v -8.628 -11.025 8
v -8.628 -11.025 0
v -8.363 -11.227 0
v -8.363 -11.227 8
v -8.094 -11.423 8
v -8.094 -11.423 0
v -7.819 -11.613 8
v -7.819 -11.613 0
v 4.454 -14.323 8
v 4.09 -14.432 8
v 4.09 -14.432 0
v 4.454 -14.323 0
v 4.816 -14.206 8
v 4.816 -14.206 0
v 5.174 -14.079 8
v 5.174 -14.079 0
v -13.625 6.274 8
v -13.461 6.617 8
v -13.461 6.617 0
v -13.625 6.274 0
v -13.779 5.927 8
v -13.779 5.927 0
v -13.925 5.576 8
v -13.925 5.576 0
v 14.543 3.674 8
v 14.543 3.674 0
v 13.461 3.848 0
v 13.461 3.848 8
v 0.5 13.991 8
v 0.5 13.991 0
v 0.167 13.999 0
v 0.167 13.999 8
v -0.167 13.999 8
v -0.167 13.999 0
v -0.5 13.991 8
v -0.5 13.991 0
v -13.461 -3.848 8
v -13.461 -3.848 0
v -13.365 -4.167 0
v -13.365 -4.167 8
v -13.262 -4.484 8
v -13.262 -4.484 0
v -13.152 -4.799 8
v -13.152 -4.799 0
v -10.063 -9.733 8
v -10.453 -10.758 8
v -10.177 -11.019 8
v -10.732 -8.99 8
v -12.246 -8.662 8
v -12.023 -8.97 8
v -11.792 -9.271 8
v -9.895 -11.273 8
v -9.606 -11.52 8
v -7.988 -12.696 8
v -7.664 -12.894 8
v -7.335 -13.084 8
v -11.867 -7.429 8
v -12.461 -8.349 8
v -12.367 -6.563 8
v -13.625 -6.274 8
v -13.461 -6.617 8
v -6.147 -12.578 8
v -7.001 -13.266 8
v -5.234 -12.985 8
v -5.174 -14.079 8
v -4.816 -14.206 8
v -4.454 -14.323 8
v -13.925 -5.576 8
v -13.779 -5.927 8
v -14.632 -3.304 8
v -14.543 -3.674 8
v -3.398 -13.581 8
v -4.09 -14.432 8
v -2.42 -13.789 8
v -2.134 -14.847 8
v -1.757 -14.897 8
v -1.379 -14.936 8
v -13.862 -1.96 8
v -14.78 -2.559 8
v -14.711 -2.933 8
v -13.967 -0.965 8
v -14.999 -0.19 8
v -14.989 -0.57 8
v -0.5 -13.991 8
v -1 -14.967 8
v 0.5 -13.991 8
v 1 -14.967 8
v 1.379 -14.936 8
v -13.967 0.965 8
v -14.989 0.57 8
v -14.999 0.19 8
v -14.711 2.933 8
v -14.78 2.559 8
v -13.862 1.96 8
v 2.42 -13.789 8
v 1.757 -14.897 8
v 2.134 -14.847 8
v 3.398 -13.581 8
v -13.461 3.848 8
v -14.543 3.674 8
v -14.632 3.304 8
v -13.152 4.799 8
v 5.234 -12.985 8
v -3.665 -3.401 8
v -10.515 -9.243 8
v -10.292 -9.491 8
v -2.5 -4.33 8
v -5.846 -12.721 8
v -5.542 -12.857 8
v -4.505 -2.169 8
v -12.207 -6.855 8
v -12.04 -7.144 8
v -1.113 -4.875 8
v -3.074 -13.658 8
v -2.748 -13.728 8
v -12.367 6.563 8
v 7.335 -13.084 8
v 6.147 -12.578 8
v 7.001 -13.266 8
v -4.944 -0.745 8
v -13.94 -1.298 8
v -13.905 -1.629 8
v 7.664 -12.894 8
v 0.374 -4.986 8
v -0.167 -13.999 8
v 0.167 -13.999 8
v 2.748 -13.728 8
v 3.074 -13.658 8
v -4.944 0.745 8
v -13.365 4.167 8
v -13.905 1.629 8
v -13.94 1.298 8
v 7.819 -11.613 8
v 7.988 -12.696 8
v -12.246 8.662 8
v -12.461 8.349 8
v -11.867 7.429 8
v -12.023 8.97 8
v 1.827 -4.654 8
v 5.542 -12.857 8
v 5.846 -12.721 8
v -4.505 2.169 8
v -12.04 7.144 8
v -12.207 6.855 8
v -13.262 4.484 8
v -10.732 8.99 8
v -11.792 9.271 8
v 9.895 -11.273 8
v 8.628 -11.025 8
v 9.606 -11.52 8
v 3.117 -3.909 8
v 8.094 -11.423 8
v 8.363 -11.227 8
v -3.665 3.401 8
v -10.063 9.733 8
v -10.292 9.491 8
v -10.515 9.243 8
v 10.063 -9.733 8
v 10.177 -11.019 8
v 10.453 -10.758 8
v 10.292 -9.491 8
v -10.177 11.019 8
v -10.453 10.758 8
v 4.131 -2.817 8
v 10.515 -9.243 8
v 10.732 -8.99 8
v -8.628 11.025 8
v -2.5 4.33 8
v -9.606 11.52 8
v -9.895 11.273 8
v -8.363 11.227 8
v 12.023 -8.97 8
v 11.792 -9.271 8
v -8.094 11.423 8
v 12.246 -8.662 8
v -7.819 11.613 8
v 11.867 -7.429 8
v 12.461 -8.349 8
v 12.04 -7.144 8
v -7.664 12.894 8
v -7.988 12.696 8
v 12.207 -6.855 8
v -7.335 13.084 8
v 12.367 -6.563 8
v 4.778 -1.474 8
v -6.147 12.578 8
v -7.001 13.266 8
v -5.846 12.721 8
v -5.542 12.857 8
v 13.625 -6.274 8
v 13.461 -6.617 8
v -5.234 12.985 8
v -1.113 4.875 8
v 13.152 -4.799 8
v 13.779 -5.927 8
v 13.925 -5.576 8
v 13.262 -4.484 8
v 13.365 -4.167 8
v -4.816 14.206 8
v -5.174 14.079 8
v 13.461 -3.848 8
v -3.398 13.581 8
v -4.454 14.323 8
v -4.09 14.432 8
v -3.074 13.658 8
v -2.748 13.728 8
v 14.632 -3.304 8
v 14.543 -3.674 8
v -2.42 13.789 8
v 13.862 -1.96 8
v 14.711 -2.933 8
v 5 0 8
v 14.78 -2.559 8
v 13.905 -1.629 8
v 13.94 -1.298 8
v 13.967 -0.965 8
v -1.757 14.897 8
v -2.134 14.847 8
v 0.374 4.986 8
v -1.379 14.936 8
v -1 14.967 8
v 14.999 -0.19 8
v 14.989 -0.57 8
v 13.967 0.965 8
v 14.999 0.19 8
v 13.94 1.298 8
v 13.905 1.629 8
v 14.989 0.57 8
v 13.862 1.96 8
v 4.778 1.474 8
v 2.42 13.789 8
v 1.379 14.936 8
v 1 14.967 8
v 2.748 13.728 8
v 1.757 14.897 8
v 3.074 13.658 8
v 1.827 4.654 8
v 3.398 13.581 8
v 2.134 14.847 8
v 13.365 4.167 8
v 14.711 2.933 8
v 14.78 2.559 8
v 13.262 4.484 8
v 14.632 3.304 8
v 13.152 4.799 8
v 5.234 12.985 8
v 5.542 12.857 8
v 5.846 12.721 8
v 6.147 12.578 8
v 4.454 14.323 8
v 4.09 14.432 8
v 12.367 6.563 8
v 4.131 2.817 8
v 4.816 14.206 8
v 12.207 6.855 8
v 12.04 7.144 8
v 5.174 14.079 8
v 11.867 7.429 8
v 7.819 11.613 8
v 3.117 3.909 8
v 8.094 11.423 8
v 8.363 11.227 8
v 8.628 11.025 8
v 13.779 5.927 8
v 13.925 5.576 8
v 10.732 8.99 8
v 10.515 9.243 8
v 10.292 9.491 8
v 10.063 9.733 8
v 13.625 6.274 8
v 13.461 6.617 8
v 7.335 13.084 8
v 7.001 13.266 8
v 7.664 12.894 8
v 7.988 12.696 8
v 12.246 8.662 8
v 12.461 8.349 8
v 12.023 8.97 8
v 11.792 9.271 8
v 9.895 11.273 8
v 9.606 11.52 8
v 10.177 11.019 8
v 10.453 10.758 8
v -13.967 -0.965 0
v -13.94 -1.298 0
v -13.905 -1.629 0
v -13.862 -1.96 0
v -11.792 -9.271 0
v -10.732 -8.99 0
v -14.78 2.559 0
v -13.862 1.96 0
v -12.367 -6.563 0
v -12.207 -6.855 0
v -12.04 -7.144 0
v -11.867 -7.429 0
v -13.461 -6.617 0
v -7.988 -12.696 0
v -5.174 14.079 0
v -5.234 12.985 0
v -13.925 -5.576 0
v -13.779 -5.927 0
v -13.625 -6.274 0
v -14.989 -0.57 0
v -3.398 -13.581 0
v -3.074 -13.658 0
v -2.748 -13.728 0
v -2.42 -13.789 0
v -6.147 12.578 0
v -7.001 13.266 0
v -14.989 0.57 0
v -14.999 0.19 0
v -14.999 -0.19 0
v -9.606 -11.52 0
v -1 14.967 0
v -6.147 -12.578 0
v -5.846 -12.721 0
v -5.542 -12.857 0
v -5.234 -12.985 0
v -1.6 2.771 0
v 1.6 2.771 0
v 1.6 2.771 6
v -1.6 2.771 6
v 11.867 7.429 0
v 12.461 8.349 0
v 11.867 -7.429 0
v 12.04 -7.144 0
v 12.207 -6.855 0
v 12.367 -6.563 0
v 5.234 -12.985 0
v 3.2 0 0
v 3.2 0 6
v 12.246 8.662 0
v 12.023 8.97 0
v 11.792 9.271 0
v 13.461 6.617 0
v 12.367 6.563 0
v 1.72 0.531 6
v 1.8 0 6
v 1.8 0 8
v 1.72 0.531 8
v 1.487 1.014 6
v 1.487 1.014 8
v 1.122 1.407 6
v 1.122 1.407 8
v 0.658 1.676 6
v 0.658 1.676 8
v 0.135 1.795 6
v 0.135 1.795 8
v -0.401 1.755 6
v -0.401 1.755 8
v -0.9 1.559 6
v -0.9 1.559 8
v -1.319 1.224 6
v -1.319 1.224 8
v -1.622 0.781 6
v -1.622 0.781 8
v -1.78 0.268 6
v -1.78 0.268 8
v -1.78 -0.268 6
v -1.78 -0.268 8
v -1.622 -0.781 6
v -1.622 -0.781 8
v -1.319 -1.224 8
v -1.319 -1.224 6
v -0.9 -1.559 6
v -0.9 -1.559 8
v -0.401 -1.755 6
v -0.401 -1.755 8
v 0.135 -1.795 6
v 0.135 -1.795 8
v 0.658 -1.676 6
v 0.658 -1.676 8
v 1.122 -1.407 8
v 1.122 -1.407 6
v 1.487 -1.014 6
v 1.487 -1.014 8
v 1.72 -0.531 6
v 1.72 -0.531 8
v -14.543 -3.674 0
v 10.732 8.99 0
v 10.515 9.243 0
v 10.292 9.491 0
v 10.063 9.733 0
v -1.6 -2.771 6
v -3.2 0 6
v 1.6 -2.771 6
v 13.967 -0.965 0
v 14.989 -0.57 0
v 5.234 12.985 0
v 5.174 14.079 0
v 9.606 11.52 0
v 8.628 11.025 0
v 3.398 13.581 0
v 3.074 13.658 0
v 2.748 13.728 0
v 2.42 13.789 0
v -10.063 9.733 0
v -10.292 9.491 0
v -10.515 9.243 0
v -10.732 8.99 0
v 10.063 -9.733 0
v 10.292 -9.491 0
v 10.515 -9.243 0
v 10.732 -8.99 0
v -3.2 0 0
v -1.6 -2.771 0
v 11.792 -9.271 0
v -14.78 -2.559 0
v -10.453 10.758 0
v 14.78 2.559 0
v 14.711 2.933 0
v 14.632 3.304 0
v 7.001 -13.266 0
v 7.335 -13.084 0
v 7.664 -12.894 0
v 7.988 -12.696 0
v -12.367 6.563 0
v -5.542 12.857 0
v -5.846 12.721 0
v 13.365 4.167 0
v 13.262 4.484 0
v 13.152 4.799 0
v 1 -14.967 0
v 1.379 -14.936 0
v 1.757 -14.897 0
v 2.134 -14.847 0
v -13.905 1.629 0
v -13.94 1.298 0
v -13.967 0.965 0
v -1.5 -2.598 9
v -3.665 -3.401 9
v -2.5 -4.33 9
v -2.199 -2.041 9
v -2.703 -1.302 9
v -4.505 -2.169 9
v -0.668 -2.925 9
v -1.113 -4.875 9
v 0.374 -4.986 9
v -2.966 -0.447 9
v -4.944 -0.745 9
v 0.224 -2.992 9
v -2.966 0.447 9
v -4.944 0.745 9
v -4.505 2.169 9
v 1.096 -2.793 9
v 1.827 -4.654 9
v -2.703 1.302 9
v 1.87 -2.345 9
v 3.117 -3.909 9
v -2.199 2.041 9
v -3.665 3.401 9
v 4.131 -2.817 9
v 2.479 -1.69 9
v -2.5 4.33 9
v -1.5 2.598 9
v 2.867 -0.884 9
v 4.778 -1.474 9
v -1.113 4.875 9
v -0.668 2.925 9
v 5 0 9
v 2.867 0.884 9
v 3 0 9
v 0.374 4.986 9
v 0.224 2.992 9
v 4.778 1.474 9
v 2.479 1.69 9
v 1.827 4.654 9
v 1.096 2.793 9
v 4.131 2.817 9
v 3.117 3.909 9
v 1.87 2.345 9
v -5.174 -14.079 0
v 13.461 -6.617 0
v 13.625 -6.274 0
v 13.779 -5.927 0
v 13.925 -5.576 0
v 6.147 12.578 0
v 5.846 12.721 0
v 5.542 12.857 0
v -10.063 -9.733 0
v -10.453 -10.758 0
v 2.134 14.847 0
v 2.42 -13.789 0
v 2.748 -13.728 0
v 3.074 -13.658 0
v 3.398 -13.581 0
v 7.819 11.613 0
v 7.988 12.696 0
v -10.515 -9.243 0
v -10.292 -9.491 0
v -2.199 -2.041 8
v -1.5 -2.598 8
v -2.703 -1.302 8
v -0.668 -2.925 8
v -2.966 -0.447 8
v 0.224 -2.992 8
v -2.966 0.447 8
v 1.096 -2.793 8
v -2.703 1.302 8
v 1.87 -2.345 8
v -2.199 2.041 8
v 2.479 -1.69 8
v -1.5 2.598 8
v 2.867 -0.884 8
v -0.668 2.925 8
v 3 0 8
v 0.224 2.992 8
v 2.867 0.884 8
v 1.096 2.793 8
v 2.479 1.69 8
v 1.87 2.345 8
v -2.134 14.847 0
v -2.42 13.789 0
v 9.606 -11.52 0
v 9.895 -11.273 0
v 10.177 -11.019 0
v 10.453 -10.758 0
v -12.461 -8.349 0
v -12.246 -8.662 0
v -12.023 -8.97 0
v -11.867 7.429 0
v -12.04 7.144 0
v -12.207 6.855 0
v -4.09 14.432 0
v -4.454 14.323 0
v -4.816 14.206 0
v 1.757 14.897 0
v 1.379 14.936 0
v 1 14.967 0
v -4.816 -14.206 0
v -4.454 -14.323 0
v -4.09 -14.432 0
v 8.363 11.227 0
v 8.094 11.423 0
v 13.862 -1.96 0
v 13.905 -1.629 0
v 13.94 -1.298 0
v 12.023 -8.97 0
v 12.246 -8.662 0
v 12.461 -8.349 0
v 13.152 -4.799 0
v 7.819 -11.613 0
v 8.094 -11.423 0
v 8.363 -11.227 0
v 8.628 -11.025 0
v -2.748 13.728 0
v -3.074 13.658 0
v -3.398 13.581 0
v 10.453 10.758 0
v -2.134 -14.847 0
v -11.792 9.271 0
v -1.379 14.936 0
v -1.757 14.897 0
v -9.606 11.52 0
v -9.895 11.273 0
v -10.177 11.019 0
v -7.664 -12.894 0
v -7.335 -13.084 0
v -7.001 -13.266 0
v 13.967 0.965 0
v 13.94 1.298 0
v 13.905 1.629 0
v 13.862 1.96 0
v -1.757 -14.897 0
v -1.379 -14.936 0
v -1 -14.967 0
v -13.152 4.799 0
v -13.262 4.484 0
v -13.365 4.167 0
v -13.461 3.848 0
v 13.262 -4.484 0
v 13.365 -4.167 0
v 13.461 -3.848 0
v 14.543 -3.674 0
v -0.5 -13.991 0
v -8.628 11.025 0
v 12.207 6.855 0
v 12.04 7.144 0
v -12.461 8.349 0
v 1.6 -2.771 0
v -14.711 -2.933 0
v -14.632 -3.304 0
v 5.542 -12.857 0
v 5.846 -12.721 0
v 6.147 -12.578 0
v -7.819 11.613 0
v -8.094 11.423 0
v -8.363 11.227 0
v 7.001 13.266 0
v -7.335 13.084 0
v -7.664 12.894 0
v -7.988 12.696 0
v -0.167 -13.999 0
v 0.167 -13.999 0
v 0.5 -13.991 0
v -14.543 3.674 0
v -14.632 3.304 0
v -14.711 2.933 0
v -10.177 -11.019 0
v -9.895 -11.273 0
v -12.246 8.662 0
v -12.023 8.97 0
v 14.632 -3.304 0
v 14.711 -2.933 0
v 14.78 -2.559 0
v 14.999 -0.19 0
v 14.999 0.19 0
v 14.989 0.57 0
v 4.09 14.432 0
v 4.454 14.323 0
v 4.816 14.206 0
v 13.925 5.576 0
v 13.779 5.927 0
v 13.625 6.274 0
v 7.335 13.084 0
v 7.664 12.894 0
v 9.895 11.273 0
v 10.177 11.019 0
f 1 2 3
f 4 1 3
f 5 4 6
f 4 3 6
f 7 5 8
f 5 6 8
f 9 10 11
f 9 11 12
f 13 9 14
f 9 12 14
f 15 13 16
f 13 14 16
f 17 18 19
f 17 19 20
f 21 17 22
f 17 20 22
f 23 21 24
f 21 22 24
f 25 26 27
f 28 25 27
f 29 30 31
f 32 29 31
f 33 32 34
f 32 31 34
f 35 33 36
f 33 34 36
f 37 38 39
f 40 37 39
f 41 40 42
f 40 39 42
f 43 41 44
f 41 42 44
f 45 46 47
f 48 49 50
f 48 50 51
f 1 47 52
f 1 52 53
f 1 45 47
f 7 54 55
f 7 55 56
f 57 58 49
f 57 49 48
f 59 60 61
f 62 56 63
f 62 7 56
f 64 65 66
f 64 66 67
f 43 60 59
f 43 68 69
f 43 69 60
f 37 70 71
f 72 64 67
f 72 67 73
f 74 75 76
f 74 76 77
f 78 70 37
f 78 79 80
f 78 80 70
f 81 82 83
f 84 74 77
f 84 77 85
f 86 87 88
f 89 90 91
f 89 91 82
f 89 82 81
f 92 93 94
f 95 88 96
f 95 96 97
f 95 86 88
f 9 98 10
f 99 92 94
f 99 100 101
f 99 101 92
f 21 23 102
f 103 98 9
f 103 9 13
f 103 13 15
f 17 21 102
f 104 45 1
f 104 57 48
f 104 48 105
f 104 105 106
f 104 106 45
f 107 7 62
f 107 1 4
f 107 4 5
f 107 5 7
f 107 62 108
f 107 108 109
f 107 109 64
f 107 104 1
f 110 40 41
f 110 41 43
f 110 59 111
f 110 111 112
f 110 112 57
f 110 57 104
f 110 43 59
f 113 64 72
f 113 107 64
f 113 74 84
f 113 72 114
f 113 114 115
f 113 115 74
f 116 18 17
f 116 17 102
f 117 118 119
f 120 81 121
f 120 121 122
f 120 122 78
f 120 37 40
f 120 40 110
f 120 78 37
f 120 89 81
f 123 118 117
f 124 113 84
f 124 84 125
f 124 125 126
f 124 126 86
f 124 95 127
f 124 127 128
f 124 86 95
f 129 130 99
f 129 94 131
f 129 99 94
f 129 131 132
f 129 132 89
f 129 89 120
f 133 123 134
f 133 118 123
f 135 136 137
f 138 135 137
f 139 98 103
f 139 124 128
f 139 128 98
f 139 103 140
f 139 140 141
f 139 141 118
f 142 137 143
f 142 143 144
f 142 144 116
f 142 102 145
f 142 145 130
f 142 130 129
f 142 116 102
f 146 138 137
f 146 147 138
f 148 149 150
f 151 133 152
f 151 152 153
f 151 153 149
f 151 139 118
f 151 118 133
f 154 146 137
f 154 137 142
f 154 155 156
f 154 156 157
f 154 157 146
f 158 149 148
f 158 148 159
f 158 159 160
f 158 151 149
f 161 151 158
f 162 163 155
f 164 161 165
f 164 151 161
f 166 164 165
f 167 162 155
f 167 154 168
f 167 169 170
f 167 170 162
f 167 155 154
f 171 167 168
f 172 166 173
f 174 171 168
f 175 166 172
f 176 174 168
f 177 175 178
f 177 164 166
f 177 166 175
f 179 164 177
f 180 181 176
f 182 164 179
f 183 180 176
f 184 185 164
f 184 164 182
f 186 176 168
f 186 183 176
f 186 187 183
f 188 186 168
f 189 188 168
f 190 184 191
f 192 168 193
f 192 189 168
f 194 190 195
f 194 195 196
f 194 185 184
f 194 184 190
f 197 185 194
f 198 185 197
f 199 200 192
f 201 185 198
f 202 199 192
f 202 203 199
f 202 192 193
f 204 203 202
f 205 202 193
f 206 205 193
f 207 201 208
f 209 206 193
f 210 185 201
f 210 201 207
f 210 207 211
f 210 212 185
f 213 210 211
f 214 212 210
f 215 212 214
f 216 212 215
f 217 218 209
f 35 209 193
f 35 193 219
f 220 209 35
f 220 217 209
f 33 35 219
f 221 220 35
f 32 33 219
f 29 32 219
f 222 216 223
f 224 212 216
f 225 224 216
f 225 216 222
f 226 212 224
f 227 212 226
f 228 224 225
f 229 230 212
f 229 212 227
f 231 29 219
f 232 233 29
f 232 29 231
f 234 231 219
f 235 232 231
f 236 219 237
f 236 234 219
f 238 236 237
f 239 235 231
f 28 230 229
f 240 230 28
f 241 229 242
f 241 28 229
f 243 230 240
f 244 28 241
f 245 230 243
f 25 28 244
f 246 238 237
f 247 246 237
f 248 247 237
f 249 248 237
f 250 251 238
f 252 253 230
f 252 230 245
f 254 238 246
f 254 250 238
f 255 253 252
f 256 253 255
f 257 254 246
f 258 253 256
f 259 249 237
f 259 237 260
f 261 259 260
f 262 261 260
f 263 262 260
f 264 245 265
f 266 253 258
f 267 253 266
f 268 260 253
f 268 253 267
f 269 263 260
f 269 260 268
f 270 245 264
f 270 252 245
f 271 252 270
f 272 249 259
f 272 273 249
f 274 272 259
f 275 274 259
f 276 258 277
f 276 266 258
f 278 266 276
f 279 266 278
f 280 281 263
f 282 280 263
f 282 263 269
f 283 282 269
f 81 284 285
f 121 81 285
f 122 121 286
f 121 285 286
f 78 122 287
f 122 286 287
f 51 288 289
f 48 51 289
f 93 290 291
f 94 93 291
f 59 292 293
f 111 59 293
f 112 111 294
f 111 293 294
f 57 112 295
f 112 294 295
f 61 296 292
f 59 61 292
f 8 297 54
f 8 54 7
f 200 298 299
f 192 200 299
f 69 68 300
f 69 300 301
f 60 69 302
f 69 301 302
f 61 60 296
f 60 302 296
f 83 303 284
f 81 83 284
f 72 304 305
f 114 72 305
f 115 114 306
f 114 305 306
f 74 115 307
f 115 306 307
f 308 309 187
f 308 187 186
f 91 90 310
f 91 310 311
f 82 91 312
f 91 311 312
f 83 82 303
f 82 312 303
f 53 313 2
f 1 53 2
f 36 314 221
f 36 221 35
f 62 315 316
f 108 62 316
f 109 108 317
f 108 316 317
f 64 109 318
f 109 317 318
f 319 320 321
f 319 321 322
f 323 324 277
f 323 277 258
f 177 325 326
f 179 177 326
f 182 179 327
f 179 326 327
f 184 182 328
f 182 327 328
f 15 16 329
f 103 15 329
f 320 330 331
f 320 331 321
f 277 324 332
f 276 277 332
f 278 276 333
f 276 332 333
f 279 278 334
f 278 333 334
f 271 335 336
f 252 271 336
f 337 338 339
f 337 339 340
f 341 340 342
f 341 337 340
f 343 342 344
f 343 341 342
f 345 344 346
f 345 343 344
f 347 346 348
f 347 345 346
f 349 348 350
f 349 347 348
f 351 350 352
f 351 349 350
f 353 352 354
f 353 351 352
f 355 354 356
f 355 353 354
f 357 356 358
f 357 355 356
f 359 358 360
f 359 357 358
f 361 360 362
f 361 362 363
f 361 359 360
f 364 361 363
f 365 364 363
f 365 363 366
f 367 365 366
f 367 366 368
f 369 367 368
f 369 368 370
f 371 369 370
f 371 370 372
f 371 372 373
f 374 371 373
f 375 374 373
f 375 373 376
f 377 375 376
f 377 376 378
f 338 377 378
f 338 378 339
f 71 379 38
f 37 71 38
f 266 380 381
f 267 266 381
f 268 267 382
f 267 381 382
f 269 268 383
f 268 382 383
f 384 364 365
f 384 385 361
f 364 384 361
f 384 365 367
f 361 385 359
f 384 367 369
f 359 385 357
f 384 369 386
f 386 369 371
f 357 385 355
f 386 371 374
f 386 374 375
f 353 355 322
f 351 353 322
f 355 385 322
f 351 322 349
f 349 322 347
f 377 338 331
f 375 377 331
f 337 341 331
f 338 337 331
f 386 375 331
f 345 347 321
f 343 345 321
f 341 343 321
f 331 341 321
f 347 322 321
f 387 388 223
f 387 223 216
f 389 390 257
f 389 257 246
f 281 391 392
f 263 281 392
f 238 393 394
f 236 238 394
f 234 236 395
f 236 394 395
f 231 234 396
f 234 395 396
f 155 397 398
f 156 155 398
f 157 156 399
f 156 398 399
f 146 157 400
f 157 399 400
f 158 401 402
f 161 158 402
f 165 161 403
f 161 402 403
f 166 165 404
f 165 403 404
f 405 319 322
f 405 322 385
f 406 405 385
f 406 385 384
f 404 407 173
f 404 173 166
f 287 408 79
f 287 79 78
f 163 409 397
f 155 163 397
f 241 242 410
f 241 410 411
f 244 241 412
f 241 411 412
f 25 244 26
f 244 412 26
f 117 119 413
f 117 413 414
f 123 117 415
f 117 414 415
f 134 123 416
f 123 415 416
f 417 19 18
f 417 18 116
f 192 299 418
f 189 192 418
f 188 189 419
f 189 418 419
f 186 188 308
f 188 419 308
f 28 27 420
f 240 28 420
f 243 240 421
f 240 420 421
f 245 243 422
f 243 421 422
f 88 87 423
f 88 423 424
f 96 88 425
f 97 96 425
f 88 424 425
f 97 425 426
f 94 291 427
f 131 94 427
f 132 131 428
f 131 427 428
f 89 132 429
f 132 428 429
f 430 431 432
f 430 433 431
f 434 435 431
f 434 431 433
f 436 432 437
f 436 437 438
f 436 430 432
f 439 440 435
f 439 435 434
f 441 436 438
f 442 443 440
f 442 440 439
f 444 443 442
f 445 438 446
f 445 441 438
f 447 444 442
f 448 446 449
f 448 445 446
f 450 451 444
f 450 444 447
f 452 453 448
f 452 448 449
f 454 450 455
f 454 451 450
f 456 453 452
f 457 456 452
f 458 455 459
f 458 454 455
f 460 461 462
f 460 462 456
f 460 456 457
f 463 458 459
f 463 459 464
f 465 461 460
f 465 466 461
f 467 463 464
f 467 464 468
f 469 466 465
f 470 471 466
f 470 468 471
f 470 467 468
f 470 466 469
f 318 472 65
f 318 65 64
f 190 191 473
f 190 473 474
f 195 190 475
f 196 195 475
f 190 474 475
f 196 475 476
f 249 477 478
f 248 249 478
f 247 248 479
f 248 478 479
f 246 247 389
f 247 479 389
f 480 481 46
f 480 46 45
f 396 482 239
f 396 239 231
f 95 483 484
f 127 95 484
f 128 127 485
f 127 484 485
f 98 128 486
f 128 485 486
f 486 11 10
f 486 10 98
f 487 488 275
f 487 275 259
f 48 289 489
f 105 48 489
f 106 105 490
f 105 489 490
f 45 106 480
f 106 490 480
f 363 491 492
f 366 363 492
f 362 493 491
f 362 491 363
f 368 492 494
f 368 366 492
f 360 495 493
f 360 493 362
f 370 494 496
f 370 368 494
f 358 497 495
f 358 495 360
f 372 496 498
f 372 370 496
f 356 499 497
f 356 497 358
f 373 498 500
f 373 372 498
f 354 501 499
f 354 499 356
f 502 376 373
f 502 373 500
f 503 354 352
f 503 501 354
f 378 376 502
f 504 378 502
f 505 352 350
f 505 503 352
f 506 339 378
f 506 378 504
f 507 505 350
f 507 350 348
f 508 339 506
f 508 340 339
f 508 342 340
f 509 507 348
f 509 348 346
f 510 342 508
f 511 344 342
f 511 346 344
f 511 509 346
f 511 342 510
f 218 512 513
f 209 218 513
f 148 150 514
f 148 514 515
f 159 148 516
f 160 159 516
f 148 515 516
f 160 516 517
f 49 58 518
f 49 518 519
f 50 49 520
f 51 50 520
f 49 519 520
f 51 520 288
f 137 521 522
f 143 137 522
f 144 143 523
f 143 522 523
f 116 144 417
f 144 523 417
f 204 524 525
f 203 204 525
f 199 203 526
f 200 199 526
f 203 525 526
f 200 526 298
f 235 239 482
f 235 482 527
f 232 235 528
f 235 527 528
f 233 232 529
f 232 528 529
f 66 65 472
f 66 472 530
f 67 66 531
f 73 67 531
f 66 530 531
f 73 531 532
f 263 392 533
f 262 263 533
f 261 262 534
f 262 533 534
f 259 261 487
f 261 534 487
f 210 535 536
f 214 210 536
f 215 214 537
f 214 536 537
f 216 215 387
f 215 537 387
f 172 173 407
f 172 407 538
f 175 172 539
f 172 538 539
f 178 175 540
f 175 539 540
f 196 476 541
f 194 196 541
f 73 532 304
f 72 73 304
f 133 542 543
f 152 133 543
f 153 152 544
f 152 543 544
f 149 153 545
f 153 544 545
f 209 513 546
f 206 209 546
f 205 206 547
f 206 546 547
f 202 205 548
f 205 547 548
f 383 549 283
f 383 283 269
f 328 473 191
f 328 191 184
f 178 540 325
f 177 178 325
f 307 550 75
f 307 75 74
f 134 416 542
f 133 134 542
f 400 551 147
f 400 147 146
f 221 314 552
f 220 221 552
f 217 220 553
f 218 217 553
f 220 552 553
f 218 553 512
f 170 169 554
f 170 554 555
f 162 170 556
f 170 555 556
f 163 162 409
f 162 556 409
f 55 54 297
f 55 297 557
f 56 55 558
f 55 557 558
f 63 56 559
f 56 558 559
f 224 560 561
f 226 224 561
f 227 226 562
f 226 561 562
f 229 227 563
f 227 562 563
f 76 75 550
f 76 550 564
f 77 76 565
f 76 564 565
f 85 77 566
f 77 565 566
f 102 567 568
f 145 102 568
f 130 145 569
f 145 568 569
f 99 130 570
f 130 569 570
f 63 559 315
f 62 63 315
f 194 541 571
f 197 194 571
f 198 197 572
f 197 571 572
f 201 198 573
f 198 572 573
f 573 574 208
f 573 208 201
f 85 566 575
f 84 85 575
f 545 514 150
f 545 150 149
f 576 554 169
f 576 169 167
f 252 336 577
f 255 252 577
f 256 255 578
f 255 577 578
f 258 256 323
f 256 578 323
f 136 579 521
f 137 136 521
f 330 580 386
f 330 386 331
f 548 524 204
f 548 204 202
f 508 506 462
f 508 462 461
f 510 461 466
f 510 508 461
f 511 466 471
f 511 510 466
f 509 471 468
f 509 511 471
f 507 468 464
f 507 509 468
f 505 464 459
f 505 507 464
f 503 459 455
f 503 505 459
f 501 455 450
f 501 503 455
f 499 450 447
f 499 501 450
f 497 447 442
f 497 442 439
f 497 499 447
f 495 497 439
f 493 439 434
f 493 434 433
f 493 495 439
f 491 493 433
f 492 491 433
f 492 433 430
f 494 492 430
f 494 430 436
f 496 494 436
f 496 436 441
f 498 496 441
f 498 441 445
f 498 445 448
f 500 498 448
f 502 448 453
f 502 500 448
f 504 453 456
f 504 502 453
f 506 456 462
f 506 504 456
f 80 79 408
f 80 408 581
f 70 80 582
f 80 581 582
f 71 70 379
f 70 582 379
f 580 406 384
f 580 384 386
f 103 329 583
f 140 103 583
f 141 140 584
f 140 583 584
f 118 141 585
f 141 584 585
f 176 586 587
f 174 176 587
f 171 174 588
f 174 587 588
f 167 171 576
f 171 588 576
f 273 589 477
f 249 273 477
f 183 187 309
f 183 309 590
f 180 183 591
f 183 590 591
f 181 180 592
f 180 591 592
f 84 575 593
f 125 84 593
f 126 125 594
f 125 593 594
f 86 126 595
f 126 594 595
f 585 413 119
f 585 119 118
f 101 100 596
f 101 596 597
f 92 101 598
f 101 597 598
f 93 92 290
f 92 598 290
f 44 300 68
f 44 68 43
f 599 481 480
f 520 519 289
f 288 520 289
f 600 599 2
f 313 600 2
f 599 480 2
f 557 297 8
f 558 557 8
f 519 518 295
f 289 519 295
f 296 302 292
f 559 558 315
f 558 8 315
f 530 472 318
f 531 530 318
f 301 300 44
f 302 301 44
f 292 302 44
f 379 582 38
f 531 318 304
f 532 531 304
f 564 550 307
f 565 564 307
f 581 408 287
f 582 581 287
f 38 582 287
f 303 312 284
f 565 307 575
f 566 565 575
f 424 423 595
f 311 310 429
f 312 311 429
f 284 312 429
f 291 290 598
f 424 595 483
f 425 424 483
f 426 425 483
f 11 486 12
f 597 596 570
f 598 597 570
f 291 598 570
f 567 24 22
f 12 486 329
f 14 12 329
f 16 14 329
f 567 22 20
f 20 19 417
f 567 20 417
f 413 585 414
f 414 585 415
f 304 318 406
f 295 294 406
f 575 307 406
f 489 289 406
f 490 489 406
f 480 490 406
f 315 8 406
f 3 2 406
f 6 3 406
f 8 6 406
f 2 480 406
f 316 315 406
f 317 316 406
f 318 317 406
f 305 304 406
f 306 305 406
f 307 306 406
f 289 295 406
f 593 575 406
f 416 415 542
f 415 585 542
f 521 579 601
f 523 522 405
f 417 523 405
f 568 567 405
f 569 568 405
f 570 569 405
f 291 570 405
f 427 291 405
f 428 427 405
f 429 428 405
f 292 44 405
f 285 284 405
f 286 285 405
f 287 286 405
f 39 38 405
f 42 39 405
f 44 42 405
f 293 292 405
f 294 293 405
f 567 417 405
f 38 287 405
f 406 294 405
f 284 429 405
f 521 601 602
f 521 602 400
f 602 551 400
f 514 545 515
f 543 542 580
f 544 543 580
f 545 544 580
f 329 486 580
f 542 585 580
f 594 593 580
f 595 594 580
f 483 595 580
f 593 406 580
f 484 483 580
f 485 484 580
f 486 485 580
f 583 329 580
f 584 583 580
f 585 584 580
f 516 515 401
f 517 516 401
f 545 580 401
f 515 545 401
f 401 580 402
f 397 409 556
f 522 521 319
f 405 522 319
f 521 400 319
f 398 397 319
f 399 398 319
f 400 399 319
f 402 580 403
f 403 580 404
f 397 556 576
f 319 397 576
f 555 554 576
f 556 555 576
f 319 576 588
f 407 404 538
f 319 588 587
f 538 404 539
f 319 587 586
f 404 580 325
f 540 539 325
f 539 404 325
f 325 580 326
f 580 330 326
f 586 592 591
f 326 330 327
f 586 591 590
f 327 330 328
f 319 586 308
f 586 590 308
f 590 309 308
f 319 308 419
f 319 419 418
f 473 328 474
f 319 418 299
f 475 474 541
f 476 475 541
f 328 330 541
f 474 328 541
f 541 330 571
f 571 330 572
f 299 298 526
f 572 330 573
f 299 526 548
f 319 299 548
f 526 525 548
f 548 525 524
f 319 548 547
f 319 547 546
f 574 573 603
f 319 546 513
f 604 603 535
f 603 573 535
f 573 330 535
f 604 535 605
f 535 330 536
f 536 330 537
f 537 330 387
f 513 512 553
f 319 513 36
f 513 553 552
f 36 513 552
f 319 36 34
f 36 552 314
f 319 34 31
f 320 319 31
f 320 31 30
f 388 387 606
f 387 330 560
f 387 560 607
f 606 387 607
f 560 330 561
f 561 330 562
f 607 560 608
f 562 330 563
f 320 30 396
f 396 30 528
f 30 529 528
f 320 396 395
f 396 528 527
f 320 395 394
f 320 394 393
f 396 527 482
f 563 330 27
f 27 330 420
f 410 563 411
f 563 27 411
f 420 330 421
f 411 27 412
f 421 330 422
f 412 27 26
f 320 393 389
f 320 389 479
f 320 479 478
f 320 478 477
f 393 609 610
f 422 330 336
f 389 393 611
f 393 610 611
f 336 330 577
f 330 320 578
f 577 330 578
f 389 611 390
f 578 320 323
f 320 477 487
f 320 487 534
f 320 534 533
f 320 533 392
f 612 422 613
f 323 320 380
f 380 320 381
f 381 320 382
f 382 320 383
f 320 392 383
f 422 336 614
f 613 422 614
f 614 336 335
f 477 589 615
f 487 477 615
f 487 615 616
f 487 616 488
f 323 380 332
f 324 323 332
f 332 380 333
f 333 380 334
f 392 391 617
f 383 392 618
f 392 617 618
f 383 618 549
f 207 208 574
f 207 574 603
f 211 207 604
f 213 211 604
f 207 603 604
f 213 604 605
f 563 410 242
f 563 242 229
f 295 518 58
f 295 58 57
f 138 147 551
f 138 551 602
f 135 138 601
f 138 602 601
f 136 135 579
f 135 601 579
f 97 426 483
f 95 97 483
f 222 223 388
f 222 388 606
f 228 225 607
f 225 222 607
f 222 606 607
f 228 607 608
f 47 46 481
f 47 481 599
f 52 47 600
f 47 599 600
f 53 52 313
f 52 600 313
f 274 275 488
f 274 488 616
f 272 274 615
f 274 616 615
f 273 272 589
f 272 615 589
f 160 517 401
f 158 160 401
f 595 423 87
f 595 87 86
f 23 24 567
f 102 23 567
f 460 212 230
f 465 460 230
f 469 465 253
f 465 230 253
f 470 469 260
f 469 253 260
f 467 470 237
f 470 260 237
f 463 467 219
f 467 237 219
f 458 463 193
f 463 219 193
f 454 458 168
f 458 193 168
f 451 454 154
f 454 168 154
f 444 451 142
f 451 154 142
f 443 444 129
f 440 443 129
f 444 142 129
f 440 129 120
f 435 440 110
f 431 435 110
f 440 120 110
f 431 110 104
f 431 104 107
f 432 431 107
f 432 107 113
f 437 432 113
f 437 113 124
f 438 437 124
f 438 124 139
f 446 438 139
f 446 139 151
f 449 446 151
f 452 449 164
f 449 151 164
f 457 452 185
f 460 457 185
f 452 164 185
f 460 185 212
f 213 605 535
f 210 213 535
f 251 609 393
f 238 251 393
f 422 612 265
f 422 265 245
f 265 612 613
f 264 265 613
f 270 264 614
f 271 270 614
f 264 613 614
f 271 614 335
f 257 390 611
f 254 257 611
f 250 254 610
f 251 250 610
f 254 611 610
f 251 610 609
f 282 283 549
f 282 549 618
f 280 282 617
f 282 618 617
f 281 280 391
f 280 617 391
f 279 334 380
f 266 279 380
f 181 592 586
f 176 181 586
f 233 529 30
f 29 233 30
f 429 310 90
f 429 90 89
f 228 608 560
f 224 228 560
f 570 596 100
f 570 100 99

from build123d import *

# Parameters (mm, degrees)
PAD001_DEPTH  = 6
PAD002_DEPTH  = 8
ARRAY_COUNT   = 30
SKETCH_R      = 15
SKETCH_R_2    = 1.8
PAD_DEPTH     = 8
SKETCH003_R   = 5
SKETCH003_R_2 = 3
PAD003_DEPTH  = 1


with BuildPart() as nutmount:
    # Sketch001 → Pad001 (new body)
    with BuildSketch(Plane.XY):
        Polygon((1.6, -2.7712812921), (3.2, 0), (1.6, 2.7712812921), (-1.6, 2.7712812921), (-3.2, 0), (-1.6, -2.7712812921), align=None)
    extrude(amount=PAD001_DEPTH)


with BuildPart() as cutblock:
    # Sketch002 → Pad002 (new body)
    with BuildSketch(Plane.XY):
        with BuildLine():
            ThreePointArc((1, 14.9666295471), (0, 15), (-1, 14.9666295471))
            Line((-1, 14.9666295471), (-0.5, 13.9910685796))
            ThreePointArc((0.5, 13.9910685796), (0, 14), (-0.5, 13.9910685796))
            Line((1, 14.9666295471), (0.5, 13.9910685796))
        make_face()
    extrude(amount=PAD002_DEPTH)

    # Array: CutBlock ×30 about axis
    array_axis = Axis((0, 0, 0), (0, 0, 1))


with BuildPart() as cutblock_1:
    add(cutblock.part)
    for i in range(1, ARRAY_COUNT):
        add(cutblock.part.rotate(array_axis, i * 360 / ARRAY_COUNT))

    # Fusion001: union NutMount
    add(nutmount.part)


with BuildPart() as base:
    # Sketch → Pad (new body)
    with BuildSketch(Plane.XY):
        Circle(SKETCH_R)
        Circle(SKETCH_R_2, mode=Mode.SUBTRACT)
    extrude(amount=PAD_DEPTH)


with BuildPart() as final:
    # Sketch003 → Pad003 (new body)
    with BuildSketch(Plane.XY.offset(8)):
        Circle(SKETCH003_R)
        Circle(SKETCH003_R_2, mode=Mode.SUBTRACT)
    extrude(amount=PAD003_DEPTH)

    # Fusion: union Base
    add(base.part)

    # Cut: cut CutBlock
    add(cutblock_1.part, mode=Mode.SUBTRACT)


solid = final.part
